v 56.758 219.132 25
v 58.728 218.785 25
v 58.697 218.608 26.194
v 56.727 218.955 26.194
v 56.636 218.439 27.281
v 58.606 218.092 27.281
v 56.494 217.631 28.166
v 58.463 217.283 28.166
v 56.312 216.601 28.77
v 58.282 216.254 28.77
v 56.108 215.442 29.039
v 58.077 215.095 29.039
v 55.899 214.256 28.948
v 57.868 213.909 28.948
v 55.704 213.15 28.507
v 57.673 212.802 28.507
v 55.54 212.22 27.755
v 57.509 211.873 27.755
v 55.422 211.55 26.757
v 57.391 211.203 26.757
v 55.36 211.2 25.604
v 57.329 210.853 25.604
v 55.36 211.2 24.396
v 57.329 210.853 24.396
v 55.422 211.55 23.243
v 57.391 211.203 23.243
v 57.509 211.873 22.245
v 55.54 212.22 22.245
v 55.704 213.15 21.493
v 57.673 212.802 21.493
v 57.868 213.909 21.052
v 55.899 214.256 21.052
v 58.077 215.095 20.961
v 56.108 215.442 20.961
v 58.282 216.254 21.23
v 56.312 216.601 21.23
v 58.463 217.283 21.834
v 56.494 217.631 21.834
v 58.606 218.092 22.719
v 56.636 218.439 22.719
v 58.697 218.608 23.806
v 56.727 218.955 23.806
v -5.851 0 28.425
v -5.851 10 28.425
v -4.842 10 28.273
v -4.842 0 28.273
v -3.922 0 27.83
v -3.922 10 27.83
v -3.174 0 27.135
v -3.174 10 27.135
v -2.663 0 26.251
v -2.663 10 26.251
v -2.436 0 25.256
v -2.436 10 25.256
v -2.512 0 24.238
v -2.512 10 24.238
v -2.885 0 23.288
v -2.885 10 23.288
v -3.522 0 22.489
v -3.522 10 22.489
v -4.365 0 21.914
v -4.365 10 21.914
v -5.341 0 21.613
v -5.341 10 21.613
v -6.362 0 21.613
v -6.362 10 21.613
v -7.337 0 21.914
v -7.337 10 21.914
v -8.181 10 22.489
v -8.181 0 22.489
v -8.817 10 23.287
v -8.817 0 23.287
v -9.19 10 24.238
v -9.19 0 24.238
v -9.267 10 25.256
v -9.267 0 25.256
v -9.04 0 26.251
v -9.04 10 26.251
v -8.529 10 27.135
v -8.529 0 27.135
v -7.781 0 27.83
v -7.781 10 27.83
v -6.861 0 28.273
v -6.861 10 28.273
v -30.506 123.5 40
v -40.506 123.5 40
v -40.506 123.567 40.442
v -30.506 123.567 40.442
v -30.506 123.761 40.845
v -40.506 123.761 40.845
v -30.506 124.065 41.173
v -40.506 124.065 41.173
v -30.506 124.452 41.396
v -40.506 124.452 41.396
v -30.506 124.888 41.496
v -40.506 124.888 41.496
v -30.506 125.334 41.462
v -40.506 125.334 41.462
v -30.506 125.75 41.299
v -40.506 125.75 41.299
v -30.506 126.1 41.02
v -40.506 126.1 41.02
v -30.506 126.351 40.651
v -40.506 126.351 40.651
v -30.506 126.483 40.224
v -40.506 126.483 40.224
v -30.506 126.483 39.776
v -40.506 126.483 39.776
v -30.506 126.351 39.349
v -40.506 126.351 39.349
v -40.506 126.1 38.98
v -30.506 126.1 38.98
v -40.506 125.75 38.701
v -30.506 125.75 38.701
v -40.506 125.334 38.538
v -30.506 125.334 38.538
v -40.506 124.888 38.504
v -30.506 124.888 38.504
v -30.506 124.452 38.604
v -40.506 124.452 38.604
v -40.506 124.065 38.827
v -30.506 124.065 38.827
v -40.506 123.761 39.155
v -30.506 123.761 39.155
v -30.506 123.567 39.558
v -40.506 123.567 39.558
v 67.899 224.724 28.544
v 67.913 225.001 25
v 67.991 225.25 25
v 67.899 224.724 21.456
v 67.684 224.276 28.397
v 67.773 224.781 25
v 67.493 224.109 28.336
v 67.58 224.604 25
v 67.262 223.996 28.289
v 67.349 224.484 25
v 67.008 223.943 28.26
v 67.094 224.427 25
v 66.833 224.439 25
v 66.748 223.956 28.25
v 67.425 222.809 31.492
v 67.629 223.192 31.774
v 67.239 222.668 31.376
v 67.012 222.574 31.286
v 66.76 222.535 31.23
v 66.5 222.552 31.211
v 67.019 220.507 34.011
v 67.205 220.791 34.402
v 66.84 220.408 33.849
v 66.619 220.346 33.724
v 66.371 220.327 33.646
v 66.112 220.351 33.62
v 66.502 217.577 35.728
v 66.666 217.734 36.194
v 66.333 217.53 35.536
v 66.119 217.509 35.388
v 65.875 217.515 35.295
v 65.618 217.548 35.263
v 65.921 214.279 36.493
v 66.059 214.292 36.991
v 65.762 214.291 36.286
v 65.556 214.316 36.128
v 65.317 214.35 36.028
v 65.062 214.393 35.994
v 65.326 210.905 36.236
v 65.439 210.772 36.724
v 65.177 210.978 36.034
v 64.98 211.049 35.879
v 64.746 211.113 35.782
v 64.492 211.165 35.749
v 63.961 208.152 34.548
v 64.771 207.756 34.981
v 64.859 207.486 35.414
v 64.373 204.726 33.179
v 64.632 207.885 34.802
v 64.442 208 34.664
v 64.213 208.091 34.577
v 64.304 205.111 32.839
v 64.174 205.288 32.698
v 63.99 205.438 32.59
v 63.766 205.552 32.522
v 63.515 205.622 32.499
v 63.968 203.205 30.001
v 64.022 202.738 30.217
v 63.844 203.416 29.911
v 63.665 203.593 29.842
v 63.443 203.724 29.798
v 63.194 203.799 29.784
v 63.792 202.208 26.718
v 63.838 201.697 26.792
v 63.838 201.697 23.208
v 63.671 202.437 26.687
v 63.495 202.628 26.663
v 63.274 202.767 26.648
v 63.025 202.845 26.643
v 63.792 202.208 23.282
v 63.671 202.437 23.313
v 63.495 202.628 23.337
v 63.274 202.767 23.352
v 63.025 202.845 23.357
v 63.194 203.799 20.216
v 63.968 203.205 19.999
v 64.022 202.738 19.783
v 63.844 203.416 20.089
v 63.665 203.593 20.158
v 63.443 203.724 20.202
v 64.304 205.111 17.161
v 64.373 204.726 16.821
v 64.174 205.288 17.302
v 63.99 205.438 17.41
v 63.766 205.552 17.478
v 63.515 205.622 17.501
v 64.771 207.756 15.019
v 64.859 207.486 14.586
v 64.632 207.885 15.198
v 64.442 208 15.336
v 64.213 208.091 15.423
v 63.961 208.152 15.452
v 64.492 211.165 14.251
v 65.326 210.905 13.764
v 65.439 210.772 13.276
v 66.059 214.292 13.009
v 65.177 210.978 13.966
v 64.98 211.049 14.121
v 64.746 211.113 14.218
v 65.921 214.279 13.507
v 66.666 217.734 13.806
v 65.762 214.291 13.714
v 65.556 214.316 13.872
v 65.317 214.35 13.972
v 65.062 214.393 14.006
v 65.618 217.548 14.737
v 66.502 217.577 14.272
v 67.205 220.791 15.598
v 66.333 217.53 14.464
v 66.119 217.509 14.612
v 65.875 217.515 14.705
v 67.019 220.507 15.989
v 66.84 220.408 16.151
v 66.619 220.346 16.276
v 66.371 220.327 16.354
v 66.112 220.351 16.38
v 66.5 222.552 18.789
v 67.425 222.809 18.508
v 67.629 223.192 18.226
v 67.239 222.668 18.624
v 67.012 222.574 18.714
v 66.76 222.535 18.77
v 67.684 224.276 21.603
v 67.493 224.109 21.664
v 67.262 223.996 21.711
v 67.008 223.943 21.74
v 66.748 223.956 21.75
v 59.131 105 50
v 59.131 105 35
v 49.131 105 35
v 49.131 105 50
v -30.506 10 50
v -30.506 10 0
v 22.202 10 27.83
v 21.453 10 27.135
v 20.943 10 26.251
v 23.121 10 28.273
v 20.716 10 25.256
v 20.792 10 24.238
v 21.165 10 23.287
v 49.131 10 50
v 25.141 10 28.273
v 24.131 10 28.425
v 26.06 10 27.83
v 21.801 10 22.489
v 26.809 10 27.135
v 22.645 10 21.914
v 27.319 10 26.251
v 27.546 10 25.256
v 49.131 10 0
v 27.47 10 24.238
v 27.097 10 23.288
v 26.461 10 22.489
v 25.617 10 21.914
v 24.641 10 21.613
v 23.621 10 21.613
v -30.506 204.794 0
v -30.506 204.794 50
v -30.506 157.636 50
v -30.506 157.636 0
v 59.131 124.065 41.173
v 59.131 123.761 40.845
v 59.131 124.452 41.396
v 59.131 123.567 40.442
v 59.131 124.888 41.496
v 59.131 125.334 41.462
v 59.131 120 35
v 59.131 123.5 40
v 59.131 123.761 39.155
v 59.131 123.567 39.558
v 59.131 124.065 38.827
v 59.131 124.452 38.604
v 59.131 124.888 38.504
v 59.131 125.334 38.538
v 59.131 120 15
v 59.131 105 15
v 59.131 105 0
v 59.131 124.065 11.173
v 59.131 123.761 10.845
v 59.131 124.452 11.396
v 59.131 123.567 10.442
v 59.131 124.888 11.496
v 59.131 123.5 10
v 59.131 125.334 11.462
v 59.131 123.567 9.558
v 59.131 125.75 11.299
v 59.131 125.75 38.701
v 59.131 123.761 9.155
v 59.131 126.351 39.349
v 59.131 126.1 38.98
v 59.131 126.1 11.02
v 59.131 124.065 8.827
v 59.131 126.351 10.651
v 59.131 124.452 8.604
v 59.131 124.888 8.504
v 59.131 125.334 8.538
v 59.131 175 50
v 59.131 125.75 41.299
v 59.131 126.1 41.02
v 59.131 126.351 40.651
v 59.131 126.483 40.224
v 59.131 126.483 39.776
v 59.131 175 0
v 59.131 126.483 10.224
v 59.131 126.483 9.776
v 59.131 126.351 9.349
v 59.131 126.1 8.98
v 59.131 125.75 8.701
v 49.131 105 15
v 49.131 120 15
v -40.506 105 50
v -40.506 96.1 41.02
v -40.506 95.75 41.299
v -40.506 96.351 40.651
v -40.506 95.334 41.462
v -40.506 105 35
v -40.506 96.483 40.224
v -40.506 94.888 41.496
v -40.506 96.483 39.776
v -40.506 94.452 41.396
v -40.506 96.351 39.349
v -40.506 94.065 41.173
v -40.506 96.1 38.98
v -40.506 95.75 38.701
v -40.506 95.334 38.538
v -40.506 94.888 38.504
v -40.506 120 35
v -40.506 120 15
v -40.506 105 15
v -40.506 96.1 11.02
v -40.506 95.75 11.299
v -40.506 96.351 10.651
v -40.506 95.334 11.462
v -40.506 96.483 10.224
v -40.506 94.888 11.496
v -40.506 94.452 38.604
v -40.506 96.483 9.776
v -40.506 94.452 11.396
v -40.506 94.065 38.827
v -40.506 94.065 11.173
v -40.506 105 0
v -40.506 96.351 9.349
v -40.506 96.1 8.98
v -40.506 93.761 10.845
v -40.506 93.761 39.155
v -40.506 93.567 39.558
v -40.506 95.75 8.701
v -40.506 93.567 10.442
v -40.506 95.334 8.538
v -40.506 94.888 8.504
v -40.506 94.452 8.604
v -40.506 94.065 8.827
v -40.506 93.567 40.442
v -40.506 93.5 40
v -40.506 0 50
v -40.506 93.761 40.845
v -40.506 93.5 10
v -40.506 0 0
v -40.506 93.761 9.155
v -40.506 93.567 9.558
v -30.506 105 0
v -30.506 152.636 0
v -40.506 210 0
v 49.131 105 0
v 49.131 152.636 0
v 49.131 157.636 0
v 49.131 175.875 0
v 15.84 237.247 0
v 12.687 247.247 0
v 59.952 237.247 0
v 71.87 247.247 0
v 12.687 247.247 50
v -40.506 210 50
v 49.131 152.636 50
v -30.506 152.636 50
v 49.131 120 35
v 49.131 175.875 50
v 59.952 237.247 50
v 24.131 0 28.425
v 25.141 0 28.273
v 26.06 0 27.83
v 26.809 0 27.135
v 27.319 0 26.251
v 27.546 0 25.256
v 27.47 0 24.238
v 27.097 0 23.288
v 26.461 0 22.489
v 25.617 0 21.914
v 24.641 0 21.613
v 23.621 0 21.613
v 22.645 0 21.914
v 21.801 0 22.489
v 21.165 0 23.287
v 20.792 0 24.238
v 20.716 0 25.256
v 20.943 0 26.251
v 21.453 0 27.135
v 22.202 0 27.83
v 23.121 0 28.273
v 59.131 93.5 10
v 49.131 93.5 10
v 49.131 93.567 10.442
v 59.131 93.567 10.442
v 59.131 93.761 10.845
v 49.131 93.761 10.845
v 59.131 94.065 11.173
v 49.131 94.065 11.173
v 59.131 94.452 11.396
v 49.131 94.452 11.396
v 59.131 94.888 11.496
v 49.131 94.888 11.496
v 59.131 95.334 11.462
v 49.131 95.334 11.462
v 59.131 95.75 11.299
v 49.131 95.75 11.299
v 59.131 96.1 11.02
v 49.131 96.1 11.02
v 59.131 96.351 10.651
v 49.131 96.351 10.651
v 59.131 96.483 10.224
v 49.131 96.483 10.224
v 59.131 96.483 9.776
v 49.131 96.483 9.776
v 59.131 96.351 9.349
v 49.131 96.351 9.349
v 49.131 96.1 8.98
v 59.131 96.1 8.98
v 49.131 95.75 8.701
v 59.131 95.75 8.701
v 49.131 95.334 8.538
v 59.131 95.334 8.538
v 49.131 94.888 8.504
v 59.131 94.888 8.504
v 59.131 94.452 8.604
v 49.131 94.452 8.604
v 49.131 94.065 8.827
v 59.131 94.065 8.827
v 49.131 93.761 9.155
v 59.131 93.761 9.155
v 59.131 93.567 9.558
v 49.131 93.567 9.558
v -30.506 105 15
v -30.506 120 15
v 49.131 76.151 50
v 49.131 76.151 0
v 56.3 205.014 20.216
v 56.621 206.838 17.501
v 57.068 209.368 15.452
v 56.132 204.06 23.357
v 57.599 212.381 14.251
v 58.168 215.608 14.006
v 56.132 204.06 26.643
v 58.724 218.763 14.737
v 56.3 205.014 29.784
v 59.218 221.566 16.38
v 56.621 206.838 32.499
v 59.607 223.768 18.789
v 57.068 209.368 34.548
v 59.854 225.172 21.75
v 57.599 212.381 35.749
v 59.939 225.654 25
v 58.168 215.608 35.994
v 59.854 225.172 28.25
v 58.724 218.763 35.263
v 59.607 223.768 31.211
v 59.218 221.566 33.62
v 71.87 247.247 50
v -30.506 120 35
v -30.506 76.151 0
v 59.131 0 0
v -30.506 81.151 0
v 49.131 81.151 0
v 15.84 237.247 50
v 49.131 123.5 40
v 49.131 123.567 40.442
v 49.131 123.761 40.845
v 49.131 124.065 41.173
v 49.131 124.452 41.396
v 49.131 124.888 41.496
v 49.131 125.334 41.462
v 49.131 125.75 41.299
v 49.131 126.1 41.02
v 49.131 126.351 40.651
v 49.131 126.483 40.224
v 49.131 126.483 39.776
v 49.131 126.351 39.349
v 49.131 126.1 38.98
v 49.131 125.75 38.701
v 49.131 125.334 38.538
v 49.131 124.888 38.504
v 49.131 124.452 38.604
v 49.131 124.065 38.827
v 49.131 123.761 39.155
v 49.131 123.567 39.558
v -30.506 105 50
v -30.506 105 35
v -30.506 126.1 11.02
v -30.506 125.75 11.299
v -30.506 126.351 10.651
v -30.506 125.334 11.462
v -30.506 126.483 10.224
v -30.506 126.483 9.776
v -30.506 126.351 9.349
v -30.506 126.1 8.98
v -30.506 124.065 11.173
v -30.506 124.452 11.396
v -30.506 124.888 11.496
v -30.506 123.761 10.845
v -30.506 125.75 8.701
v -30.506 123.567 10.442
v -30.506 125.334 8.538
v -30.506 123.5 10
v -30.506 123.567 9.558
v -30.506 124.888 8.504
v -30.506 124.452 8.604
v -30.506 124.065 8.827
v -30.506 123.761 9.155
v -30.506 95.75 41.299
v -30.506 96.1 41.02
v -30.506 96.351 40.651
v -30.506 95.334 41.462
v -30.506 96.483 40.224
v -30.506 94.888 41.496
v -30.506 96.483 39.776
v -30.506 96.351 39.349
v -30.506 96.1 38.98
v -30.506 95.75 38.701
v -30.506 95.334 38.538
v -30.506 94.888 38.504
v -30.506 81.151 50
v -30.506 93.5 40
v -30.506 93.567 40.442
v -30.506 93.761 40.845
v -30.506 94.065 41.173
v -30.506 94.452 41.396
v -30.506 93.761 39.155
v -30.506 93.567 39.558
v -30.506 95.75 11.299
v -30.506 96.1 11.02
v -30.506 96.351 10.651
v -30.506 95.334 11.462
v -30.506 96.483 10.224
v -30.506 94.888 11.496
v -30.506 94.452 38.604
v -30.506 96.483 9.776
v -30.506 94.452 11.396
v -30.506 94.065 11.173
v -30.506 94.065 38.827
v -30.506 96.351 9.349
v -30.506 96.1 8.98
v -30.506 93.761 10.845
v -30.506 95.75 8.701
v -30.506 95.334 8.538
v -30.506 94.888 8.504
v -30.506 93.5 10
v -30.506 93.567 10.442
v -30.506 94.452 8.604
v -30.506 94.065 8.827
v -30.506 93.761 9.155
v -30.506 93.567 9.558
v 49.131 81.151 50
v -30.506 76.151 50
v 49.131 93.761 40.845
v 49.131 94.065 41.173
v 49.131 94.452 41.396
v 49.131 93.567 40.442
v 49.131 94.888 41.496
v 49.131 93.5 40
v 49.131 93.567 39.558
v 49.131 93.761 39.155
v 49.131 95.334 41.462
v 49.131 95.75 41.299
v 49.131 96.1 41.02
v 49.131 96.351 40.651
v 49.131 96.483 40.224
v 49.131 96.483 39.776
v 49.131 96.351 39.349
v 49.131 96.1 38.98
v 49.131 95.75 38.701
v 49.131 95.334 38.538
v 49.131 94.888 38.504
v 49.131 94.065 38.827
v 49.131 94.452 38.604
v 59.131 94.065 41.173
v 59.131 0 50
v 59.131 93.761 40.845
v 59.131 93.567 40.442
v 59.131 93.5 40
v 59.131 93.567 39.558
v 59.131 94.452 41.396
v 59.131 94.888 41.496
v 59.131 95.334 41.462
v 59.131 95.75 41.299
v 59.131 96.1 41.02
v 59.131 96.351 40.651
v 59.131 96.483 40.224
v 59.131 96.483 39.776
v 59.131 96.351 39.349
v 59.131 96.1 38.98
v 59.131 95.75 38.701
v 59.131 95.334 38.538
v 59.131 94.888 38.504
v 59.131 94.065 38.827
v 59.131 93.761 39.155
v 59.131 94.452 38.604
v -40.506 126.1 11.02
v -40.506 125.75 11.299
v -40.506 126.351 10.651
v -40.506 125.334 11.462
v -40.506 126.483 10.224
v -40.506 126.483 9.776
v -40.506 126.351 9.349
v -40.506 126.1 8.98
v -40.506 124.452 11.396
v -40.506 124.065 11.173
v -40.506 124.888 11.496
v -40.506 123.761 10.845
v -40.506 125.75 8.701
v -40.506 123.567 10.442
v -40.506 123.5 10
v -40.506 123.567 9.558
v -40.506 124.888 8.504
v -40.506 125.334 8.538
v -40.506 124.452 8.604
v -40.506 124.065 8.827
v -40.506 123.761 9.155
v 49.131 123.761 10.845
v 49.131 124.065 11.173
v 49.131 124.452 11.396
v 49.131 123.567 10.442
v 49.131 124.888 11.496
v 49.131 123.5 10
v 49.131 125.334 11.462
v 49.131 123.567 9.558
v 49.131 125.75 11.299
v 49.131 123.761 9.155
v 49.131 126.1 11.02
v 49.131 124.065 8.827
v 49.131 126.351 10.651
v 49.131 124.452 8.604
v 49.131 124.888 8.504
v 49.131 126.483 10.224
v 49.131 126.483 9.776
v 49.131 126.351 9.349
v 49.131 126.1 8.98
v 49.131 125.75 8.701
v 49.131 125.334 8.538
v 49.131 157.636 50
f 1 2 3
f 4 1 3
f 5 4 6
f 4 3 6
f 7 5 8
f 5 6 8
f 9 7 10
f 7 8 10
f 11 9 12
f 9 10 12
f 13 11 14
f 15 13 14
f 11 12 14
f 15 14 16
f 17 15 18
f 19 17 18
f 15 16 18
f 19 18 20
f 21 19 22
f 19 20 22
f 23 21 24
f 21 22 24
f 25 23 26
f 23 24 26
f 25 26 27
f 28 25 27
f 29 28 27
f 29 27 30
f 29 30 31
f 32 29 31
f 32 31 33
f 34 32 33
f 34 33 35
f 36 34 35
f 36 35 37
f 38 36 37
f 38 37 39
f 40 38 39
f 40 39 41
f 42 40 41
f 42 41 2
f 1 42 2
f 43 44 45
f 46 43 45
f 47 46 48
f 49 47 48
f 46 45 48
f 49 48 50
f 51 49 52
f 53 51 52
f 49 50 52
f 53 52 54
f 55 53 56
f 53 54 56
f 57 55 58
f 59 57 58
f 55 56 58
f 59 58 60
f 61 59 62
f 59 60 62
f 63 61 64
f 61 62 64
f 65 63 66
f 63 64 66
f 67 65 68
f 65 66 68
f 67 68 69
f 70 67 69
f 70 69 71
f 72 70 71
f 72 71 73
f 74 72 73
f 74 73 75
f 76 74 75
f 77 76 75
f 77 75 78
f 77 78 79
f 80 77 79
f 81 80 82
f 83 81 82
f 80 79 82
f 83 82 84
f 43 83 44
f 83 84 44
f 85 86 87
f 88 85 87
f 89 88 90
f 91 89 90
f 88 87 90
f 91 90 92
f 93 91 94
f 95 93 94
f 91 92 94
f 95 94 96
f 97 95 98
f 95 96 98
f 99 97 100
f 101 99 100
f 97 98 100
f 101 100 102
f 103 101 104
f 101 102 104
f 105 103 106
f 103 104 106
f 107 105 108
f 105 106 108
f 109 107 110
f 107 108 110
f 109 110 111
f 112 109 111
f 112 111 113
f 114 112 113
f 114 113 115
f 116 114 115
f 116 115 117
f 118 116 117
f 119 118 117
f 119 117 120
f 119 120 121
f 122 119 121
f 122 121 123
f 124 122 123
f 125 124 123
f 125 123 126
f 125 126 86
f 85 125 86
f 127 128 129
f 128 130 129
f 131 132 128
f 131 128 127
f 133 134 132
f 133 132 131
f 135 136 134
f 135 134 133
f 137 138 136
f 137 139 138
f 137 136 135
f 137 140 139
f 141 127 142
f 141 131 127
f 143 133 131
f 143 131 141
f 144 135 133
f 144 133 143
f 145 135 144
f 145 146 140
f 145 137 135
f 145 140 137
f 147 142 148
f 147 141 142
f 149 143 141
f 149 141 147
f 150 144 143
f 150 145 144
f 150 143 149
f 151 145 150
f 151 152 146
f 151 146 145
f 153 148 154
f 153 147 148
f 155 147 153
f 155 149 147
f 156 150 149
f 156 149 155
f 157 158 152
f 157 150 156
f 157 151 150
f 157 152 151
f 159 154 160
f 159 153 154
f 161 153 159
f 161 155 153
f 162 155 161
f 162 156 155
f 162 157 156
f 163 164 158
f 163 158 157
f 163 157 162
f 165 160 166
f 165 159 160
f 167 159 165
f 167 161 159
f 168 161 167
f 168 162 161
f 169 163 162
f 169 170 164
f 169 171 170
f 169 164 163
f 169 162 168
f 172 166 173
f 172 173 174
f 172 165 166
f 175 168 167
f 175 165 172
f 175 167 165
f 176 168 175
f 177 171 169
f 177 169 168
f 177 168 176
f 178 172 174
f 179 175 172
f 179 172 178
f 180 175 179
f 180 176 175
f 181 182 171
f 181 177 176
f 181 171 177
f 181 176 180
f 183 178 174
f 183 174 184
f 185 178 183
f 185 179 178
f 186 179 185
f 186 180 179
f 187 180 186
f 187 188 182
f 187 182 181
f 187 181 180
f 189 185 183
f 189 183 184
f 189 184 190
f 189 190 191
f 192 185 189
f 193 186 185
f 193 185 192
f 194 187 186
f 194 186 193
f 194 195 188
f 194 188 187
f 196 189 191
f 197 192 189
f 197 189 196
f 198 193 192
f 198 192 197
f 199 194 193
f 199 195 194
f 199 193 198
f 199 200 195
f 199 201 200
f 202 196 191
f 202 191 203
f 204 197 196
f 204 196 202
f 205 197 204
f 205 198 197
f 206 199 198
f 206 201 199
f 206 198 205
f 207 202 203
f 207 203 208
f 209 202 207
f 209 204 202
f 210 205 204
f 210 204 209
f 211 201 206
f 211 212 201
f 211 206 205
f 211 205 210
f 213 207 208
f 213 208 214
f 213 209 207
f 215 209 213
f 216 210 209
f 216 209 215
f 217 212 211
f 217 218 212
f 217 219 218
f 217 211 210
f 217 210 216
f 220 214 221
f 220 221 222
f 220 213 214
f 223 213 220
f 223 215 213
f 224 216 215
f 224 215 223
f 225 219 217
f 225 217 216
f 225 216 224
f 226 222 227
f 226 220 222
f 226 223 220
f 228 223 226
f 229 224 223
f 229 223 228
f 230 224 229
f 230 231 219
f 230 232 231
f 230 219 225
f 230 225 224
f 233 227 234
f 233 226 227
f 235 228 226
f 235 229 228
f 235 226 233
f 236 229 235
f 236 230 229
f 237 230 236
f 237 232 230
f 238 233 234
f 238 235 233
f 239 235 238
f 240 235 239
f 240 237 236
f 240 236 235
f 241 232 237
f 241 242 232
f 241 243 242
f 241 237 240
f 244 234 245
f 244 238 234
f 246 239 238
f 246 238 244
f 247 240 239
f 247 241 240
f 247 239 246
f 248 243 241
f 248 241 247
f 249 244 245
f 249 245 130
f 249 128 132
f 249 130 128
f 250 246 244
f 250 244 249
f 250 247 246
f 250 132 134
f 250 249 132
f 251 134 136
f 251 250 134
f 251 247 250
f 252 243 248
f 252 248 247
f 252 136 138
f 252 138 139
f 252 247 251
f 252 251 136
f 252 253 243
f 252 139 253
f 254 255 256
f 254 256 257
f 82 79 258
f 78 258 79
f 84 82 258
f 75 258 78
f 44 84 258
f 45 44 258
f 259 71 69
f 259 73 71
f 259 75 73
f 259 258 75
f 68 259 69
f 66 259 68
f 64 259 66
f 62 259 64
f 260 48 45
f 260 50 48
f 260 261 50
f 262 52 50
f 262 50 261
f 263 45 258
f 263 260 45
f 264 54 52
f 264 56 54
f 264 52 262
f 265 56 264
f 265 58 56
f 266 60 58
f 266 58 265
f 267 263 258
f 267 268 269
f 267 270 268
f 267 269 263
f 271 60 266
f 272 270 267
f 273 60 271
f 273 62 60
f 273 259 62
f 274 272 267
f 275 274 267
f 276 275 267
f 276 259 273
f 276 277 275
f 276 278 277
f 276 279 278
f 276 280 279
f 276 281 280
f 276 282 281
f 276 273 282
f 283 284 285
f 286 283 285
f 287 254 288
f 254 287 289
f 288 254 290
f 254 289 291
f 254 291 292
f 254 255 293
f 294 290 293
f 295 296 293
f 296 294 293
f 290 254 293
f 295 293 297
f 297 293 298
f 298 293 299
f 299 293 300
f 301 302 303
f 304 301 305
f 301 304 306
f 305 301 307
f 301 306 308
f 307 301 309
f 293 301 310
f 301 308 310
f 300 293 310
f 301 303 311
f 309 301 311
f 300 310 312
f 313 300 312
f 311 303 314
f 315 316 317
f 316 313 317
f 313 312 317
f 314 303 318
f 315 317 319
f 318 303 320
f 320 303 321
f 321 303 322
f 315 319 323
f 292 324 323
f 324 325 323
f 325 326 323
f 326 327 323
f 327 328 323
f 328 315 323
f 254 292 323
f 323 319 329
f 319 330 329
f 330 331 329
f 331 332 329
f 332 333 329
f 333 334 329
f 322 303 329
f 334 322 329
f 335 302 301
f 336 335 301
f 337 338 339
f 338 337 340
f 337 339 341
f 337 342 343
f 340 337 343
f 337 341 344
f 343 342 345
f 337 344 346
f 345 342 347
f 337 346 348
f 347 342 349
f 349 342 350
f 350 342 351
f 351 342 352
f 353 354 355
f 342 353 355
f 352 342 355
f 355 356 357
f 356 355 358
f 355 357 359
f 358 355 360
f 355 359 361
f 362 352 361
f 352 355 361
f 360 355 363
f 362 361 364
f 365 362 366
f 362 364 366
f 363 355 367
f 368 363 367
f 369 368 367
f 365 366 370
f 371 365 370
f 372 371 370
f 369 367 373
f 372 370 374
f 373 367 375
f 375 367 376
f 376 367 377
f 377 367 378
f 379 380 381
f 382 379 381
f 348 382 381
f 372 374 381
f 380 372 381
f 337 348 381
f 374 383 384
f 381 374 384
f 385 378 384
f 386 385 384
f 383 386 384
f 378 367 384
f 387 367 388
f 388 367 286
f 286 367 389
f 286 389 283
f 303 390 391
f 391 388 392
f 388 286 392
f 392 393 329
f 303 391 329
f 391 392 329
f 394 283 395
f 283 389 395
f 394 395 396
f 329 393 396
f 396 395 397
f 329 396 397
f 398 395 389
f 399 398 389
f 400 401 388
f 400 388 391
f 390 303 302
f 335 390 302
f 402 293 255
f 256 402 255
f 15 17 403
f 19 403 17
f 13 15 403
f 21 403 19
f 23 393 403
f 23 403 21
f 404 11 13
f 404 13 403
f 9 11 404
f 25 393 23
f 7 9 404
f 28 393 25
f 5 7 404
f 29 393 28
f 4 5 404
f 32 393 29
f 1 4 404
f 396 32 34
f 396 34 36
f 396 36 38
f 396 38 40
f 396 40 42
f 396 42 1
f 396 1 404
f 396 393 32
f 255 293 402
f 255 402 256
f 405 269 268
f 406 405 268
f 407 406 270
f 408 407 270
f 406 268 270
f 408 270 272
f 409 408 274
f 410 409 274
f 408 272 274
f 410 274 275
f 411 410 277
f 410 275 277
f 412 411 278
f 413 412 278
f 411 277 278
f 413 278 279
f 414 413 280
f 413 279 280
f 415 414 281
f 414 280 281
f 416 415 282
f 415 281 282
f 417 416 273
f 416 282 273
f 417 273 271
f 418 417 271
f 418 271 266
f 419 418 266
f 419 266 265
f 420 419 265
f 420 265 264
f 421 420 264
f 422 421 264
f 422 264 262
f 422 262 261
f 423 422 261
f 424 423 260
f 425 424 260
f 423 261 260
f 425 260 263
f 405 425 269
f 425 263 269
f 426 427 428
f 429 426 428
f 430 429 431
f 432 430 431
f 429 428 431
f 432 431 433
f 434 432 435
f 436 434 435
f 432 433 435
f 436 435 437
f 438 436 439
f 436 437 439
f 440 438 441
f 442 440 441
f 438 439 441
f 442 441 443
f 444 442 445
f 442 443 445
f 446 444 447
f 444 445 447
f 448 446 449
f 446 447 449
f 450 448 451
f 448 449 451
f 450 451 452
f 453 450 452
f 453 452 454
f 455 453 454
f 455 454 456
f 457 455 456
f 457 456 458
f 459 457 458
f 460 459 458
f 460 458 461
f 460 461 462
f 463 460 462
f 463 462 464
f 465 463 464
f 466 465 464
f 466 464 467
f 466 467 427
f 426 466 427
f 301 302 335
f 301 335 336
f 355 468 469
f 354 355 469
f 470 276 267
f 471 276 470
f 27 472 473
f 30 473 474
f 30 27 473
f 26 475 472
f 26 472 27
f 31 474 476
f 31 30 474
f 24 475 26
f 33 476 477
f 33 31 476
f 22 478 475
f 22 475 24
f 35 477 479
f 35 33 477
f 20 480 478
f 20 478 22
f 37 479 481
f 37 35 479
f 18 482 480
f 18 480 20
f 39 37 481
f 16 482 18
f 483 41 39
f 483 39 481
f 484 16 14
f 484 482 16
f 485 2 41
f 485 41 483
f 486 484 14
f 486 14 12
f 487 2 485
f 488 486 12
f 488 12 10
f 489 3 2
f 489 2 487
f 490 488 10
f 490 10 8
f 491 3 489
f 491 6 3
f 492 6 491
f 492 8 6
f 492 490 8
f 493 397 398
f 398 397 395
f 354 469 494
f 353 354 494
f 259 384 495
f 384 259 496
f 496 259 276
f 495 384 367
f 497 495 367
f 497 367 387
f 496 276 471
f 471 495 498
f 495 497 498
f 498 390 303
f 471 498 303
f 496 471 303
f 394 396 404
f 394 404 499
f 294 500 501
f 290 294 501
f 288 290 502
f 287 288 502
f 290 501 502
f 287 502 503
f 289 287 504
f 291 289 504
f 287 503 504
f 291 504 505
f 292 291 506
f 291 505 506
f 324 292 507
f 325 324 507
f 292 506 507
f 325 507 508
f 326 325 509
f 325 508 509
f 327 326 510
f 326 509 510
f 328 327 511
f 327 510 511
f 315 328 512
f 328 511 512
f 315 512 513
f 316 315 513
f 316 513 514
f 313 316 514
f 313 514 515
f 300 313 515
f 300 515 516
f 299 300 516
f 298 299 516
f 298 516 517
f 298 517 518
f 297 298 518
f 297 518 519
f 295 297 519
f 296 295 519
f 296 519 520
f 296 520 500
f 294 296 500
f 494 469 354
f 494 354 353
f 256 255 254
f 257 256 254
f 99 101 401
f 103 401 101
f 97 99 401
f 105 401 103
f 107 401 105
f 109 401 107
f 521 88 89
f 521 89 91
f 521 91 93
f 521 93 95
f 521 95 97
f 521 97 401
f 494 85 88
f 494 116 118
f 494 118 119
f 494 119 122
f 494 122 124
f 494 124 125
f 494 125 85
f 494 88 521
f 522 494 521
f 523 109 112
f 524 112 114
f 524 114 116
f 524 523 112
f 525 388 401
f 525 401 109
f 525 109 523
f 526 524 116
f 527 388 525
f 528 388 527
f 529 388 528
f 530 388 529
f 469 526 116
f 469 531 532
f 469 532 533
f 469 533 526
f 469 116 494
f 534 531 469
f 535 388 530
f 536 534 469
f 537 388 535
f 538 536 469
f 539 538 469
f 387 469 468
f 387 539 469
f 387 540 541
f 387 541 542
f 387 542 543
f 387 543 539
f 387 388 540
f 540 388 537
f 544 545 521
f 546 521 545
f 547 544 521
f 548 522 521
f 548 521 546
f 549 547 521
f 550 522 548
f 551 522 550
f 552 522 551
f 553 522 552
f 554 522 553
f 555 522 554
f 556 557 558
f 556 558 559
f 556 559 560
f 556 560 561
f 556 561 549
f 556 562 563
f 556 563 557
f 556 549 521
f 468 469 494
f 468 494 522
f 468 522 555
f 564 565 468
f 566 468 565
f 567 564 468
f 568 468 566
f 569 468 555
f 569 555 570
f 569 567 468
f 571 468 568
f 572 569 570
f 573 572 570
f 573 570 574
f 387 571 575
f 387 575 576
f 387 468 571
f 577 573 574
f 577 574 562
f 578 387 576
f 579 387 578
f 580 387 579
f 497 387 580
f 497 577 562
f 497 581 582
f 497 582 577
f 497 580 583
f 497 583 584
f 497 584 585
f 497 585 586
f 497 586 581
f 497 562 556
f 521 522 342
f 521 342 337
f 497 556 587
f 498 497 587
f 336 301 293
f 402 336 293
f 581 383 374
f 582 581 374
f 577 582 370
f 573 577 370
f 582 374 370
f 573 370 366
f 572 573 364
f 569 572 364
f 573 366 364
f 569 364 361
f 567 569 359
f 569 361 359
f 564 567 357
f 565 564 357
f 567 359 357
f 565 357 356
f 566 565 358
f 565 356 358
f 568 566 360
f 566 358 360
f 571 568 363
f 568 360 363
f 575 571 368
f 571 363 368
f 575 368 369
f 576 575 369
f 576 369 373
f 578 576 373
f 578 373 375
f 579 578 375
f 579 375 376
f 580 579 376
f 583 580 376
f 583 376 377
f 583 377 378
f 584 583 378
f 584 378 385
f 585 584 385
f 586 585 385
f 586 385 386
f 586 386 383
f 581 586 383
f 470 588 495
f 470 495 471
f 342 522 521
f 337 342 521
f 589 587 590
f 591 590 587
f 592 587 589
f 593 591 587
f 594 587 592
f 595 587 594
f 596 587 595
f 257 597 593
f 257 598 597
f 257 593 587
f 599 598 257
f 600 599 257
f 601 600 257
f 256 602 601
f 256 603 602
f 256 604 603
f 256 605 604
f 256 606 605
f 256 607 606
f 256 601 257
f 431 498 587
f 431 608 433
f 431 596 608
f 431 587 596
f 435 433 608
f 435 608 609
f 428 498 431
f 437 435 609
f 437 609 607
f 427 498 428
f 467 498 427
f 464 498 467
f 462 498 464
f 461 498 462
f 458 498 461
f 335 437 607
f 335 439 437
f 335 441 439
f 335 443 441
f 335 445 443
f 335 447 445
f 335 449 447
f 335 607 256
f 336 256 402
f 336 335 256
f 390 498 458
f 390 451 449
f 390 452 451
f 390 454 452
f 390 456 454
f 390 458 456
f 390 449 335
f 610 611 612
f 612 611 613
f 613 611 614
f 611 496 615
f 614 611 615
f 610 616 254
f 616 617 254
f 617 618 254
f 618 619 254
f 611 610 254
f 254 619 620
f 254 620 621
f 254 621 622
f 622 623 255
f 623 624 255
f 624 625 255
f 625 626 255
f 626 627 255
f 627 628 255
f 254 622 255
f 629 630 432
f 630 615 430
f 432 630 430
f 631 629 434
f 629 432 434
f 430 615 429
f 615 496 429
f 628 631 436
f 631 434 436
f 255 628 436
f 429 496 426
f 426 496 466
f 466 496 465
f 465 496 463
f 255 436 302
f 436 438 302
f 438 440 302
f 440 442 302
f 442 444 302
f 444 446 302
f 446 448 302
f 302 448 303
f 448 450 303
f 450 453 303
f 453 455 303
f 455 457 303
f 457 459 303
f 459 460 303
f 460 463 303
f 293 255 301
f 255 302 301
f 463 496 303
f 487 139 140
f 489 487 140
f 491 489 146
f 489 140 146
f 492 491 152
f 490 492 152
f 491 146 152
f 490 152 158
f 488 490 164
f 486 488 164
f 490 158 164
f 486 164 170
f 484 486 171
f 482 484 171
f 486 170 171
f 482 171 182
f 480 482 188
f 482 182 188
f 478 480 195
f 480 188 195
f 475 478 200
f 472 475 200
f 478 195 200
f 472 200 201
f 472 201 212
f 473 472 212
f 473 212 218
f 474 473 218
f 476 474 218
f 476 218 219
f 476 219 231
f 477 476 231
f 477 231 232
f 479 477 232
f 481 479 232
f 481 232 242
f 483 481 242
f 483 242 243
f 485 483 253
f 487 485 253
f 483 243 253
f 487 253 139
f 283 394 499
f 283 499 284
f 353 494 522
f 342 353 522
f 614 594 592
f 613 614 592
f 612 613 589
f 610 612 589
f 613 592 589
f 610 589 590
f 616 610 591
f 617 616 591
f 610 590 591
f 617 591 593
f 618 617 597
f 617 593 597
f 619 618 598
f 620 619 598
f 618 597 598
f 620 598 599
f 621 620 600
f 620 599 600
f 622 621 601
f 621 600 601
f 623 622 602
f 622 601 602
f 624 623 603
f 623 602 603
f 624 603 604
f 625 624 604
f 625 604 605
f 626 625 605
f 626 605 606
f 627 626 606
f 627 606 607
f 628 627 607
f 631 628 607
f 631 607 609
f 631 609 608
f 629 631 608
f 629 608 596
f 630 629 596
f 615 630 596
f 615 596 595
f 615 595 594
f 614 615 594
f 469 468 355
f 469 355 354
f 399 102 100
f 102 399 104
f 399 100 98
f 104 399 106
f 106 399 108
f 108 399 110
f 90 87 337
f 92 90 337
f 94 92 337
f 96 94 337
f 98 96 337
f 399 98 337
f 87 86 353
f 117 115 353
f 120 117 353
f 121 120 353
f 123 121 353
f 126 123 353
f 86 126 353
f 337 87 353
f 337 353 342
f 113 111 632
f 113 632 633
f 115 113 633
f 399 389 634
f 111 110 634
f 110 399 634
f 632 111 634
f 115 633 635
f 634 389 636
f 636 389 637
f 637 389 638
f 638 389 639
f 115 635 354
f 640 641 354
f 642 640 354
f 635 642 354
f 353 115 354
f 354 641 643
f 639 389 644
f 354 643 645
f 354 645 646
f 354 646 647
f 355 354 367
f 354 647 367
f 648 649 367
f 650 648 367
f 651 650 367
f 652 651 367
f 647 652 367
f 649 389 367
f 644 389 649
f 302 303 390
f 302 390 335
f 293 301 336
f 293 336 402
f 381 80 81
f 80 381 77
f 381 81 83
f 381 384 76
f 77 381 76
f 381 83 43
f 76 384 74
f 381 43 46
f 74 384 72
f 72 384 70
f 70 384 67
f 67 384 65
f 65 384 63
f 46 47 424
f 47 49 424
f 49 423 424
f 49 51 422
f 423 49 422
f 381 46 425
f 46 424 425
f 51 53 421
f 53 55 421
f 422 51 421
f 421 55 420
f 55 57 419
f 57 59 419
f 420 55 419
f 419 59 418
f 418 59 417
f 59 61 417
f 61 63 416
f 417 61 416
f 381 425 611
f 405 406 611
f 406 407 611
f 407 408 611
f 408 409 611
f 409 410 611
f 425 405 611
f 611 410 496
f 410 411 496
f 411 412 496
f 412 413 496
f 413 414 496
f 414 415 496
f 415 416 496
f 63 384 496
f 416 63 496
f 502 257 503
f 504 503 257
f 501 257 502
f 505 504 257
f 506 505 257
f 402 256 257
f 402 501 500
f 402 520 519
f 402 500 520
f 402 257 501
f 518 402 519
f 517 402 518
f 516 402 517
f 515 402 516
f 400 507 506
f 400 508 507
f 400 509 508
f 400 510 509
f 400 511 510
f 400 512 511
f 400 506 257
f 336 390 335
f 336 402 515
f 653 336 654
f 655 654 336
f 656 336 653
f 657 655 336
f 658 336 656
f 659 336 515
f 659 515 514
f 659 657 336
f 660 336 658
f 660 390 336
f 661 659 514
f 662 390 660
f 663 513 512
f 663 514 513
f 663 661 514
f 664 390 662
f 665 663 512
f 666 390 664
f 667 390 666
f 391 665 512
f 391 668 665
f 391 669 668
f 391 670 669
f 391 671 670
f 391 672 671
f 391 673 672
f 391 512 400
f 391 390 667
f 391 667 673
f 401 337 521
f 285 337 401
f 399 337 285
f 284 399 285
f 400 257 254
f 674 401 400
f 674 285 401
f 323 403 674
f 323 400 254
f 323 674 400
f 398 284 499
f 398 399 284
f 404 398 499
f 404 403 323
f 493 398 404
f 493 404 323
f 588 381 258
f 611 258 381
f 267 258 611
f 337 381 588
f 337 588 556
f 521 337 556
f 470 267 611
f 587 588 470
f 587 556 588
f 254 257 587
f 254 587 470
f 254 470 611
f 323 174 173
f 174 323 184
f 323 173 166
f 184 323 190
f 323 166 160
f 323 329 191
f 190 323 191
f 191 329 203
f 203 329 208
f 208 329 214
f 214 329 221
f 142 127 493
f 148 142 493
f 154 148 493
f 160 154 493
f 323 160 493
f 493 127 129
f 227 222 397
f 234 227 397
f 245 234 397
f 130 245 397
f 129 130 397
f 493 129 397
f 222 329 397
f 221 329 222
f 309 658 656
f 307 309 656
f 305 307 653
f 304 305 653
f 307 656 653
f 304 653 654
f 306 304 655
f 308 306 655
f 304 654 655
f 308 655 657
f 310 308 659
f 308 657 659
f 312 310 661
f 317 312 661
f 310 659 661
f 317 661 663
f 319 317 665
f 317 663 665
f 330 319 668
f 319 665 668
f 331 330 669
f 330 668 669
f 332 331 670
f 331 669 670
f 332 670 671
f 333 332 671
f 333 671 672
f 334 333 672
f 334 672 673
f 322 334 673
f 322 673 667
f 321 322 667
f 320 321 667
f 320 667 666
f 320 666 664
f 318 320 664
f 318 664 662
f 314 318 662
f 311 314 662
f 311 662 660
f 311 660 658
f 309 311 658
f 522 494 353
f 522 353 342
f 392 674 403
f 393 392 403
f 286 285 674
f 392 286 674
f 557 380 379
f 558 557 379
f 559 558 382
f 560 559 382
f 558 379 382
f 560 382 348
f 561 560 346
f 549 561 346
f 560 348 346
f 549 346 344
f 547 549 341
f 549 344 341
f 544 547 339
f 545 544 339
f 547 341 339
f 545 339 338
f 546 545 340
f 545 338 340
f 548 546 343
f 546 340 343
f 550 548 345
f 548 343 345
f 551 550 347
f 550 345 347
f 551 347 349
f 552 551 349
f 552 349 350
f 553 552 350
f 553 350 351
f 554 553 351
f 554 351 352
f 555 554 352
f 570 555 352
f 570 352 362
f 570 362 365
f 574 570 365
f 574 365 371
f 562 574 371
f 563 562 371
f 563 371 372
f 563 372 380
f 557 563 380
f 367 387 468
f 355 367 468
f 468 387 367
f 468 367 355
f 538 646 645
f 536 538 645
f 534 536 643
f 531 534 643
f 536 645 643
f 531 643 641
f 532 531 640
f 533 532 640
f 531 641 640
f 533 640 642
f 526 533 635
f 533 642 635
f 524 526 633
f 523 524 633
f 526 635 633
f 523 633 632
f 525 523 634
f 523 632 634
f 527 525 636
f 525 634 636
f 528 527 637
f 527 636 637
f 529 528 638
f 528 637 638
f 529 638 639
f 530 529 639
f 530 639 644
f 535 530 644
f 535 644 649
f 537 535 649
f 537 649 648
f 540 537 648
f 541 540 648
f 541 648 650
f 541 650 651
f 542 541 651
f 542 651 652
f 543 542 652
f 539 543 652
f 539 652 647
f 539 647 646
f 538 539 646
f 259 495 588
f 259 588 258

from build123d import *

# Parameters (mm, degrees)
BOSS_EXTRUDE1_DEPTH    = 50
SKETCH10_R             = 3.425
CUT_EXTRUDE5_DEPTH     = 10
SKETCH11_W             = 79.637459777
SKETCH11_H             = 5
BOSS_EXTRUDE3_DEPTH    = 50
SKETCH14_R             = 11.025
CUT_EXTRUDE6_DEPTH     = 8
SKETCH15_R             = 4.05
CUT_EXTRUDE7_DEPTH     = 3
FILLET1_R              = 1
SKETCH16_R             = 1.5
CUT_EXTRUDE8_DEPTH     = 277.151028537
SPLIT1_SURFACE_1_BACK  = 277.151
SPLIT1_SURFACE_1_DEPTH = 554.302
SPLIT1_SURFACE_2_BACK  = 277.151
SPLIT1_SURFACE_2_DEPTH = 554.302


with BuildPart() as part:
    # Sketch2 → Boss-Extrude1 (new body)
    with BuildSketch(Plane.XY):
        Polygon((-40.506485759, 0), (59.130974018, 0), (59.130974018, 175), (71.870010435, 247.246665631), (12.687265519, 247.246665631), (-40.506485759, 210), align=None)
        Polygon((49.130974018, 175.874886635), (59.952474509, 237.246665631), (15.840253408, 237.246665631), (-30.506485759, 204.794329494), (-30.506485759, 10), (49.130974018, 10), align=None, mode=Mode.SUBTRACT)
    extrude(amount=BOSS_EXTRUDE1_DEPTH)

    # Sketch10 → Cut-Extrude5 (cut)
    with BuildSketch(Plane(origin=(0, 10, 0), x_dir=(1, 0, 0), z_dir=(0, 1, 0))):
        with Locations(Location((-5.851287133, -25, 0), (0, 0, 270))):
            Circle(SKETCH10_R)
        with Locations(Location((24.130974018, -25, 0), (0, 0, 270))):
            Circle(SKETCH10_R)
    extrude(amount=-CUT_EXTRUDE5_DEPTH, mode=Mode.SUBTRACT)

    # Sketch11 → Boss-Extrude3 (add)
    with BuildSketch(Plane.XY.offset(50)):
        with Locations((9.31224413, 155.135730726)):
            Rectangle(SKETCH11_W, SKETCH11_H)
        with Locations((9.31224413, 78.651297101)):
            Rectangle(SKETCH11_W, SKETCH11_H)
    extrude(amount=-BOSS_EXTRUDE3_DEPTH)

    # Sketch14 → Cut-Extrude6 (cut)
    with BuildSketch(Plane(origin=(27.42119444, -4.835096423, 0), x_dir=(0, 0, -1), z_dir=(0.9848077530122082, -0.17364817766693028, 0))):
        with Locations(Location((-25, 221.609342659, 0), (0, 0, 90))):
            Circle(SKETCH14_R)
    extrude(amount=-CUT_EXTRUDE6_DEPTH, mode=Mode.SUBTRACT)

    # Sketch15 → Cut-Extrude7 (cut)
    with BuildSketch(Plane(origin=(19.542732416, -3.445911002, 0), x_dir=(0, 0, -1), z_dir=(0.984807753012208, -0.1736481776669303, 0))):
        with Locations(Location((-25, 221.609342659, 0), (0, 0, 90))):
            Circle(SKETCH15_R)
    extrude(amount=-CUT_EXTRUDE7_DEPTH, mode=Mode.SUBTRACT)

    # Fillet1
    fillet1_edges = [part.edges().sort_by_distance(p)[0] for p in [
        (63.988781788, 202.549996891, 25),
    ]]
    fillet(fillet1_edges, radius=FILLET1_R)

    # Sketch16 → Cut-Extrude8 (cut, through all)
    with BuildSketch(Plane.ZY.offset(40.506485759)):
        with Locations(Location((40, 125, 0), (0, 0, 270))):
            Circle(SKETCH16_R)
        with Locations(Location((40, 95, 0), (0, 0, 270))):
            Circle(SKETCH16_R)
        with Locations(Location((10, 95, 0), (0, 0, 270))):
            Circle(SKETCH16_R)
        with Locations(Location((10, 125, 0), (0, 0, 270))):
            Circle(SKETCH16_R)
    extrude(amount=-CUT_EXTRUDE8_DEPTH, mode=Mode.SUBTRACT)


with BuildPart() as body_2:
    # Split1: the piece behind the surface
    add(part.part)
    # Split1 surface: a surface, the sketch's curves swept straight by 554.302 mm
    with BuildLine(Plane.ZY.offset(40.506485759).offset(-SPLIT1_SURFACE_1_BACK), mode=Mode.PRIVATE) as split1_surface_1_path:
        Line((0, 105), (15, 105))
        Line((15, 105), (15, 120))
        Line((15, 120), (35, 120))
        Line((35, 120), (35, 105))
        Line((35, 105), (50, 105))
    split1_surface_1 = Shell.extrude(split1_surface_1_path.wire(), (-1 * SPLIT1_SURFACE_1_DEPTH, 0 * SPLIT1_SURFACE_1_DEPTH, 0 * SPLIT1_SURFACE_1_DEPTH))
    split(bisect_by=split1_surface_1, keep=Keep.BOTTOM)


with BuildPart() as part_1:
    add(part.part)

    # Split1: split by a surface, the side it looks to stays
    # Split1 surface: a surface, the sketch's curves swept straight by 554.302 mm
    with BuildLine(Plane.ZY.offset(40.506485759).offset(-SPLIT1_SURFACE_2_BACK), mode=Mode.PRIVATE) as split1_surface_2_path:
        Line((0, 105), (15, 105))
        Line((15, 105), (15, 120))
        Line((15, 120), (35, 120))
        Line((35, 120), (35, 105))
        Line((35, 105), (50, 105))
    split1_surface_2 = Shell.extrude(split1_surface_2_path.wire(), (-1 * SPLIT1_SURFACE_2_DEPTH, 0 * SPLIT1_SURFACE_2_DEPTH, 0 * SPLIT1_SURFACE_2_DEPTH))
    split(bisect_by=split1_surface_2, keep=Keep.TOP)


solid = Compound([body_2.part, part_1.part])
